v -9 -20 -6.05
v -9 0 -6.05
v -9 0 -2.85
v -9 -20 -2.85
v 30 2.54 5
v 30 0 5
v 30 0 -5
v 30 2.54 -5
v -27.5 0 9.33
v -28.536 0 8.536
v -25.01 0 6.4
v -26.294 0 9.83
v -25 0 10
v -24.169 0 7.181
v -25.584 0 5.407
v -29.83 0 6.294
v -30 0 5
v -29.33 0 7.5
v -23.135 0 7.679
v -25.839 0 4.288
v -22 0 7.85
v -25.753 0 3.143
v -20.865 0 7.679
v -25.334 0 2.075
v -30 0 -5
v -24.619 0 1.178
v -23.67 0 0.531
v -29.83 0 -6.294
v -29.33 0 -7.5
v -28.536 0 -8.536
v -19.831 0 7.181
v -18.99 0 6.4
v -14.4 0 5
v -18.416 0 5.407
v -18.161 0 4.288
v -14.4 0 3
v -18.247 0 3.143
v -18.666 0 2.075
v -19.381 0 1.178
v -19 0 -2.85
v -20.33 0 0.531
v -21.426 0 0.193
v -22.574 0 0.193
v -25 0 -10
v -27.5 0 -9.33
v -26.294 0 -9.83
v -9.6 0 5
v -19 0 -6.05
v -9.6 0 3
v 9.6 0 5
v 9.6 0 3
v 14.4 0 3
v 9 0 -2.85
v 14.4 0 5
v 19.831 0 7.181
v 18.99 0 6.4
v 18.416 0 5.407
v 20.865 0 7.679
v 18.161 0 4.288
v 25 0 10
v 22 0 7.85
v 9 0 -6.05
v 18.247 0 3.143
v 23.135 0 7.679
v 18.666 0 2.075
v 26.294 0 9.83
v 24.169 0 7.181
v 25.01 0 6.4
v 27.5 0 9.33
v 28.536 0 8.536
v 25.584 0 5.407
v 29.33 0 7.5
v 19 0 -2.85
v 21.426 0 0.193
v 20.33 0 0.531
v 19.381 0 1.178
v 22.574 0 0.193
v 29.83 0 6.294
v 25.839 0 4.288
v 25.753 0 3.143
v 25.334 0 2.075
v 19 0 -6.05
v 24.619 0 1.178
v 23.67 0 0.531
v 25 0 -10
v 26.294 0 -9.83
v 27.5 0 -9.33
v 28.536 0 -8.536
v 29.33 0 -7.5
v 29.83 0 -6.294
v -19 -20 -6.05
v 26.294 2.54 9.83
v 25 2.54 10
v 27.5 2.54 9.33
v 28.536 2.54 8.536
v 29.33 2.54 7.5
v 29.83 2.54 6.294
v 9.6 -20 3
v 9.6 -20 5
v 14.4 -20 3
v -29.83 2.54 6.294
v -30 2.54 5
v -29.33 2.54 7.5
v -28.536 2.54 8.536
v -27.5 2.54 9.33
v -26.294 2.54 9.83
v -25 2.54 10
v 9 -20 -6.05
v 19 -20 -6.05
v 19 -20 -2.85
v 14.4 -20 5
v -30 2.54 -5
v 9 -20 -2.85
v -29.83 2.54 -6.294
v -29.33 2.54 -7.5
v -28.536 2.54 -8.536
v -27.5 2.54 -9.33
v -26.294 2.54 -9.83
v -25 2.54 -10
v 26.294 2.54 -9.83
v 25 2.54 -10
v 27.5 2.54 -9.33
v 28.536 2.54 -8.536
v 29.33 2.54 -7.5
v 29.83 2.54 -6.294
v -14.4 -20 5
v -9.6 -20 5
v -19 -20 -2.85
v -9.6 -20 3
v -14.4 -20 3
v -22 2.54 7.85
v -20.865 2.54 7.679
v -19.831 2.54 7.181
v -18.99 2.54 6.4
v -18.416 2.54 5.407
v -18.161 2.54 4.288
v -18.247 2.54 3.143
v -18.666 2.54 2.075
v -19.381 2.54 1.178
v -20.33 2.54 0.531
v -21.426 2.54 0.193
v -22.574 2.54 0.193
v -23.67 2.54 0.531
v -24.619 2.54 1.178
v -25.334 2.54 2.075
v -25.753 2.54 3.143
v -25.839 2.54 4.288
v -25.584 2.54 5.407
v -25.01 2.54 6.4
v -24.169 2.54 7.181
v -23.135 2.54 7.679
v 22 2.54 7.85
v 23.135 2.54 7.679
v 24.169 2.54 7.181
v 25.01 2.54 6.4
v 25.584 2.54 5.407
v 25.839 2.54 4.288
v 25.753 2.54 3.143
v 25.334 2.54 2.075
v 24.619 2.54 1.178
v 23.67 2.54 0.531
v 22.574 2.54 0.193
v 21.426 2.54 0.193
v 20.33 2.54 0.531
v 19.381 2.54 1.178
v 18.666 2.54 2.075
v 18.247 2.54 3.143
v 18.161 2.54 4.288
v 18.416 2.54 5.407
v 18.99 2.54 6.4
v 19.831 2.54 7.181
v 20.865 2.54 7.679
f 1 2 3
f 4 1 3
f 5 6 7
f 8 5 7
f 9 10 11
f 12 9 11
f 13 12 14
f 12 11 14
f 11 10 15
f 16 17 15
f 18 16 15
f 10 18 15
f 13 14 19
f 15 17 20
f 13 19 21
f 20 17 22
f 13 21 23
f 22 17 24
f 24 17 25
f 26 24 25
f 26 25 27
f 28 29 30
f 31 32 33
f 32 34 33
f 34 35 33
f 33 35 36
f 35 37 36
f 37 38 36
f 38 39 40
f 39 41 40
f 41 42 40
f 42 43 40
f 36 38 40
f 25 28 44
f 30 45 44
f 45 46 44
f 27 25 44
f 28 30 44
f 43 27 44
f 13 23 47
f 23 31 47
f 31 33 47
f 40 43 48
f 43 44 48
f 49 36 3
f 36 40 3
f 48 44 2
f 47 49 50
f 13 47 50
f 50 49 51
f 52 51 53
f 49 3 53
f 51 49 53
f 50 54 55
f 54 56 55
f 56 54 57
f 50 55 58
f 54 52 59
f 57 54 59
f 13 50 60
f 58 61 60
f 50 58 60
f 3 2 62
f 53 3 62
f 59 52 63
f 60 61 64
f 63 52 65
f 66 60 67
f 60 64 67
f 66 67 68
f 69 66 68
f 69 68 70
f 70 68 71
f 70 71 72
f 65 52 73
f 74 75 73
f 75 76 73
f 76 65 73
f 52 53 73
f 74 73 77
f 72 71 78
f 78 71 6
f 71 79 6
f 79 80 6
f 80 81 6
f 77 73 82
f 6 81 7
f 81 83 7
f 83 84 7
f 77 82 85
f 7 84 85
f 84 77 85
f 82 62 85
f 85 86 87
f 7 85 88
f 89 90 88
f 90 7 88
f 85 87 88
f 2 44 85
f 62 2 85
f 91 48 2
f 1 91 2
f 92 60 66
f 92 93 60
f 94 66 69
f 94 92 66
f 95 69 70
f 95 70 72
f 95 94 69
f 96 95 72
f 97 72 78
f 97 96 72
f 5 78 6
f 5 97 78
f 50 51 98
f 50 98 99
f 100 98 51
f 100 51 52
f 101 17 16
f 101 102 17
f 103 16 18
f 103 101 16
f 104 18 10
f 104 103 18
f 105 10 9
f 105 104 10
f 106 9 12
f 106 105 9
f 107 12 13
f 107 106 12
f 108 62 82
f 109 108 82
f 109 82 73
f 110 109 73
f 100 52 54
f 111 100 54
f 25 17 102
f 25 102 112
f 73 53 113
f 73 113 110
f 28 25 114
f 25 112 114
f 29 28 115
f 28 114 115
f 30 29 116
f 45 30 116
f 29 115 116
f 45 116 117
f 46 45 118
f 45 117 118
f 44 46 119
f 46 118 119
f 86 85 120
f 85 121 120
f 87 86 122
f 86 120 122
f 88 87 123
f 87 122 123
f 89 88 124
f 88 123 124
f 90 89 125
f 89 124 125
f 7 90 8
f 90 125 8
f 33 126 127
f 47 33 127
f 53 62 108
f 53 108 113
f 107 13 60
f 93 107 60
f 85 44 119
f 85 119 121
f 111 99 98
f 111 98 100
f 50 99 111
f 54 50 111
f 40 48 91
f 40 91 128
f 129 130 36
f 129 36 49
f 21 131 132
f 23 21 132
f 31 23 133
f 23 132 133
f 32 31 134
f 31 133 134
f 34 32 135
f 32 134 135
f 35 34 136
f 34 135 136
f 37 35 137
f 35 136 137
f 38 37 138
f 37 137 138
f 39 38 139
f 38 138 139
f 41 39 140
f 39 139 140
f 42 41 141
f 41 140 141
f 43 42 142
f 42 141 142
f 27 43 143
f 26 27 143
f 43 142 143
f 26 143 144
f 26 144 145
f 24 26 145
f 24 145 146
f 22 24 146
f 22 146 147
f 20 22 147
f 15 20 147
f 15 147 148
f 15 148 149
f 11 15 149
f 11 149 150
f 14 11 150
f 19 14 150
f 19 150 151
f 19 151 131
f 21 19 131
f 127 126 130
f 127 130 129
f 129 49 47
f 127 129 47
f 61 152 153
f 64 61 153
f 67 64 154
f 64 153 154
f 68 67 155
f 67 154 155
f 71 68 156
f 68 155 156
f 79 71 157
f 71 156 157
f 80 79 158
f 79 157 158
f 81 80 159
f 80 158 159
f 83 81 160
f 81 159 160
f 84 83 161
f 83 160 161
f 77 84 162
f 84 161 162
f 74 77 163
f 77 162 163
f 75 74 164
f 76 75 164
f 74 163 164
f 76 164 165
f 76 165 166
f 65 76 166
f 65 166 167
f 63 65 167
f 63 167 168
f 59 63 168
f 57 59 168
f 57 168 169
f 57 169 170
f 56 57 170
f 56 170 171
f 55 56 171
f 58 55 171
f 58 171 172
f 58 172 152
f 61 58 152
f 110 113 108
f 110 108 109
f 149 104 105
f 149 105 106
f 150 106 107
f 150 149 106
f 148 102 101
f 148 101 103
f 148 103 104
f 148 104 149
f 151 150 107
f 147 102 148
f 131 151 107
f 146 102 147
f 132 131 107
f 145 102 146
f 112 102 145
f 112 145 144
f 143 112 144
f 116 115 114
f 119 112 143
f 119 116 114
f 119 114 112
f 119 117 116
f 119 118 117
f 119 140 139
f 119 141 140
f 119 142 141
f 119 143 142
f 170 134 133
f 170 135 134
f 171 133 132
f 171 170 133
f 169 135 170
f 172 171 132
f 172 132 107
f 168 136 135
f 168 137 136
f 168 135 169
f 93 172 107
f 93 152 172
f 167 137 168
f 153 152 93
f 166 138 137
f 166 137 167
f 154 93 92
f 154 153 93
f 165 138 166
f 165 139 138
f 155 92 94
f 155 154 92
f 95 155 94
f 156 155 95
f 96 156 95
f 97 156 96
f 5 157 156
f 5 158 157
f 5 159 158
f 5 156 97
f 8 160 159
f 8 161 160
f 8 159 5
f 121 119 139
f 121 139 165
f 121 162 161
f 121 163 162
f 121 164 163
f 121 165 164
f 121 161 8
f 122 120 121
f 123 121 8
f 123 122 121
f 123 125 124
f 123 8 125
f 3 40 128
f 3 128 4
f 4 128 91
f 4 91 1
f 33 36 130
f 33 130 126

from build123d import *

# Parameters (mm, degrees)
SKETCH1_W            = 60
SKETCH1_H            = 20
BOSS_EXTRUDE1_DEPTH  = 2.54
SKETCH2_R            = 3.85
EYESHAFT_HOLES_DEPTH = 10
SKETCH5_W            = 4.8
SKETCH5_H            = 2
FRONT_LEGS_DEPTH     = 20
SKETCH7_W            = 10
SKETCH7_H            = 3.2
BACK_LEGS_DEPTH      = 20
FILLET2_R            = 5


with BuildPart() as part:
    # Sketch1 → Boss-Extrude1 (new body)
    with BuildSketch(Plane(origin=(0, 0, 0), x_dir=(1, 0, 0), z_dir=(0, 1, 0))):
        Rectangle(SKETCH1_W, SKETCH1_H)
    extrude(amount=BOSS_EXTRUDE1_DEPTH)

    # Sketch2 → Eyeshaft holes (cut)
    with BuildSketch(Plane(origin=(0, 2.54, 0), x_dir=(1, 0, 0), z_dir=(0, 1, 0))):
        with Locations(Location((-22, -4, 0), (0, 0, 270))):
            Circle(SKETCH2_R)
        with Locations(Location((22, -4, 0), (0, 0, 270))):
            Circle(SKETCH2_R)
    extrude(amount=-EYESHAFT_HOLES_DEPTH, mode=Mode.SUBTRACT)

    # Sketch5 → Front Legs (add)
    with BuildSketch(Plane.XZ):
        with Locations((-12, 4)):
            Rectangle(SKETCH5_W, SKETCH5_H)
        with Locations((12, 4)):
            Rectangle(SKETCH5_W, SKETCH5_H)
    extrude(amount=FRONT_LEGS_DEPTH)

    # Sketch7 → Back legs (add)
    with BuildSketch(Plane.XZ):
        with Locations((-14, -4.45)):
            Rectangle(SKETCH7_W, SKETCH7_H)
        with Locations((14, -4.45)):
            Rectangle(SKETCH7_W, SKETCH7_H)
    extrude(amount=BACK_LEGS_DEPTH)

    # Fillet2
    fillet2_edges = [part.edges().sort_by_distance(p)[0] for p in [
        (30, 1.27, 10),
        (-30, 1.27, 10),
        (-30, 1.27, -10),
        (30, 1.27, -10),
    ]]
    fillet(fillet2_edges, radius=FILLET2_R)


solid = part.part
